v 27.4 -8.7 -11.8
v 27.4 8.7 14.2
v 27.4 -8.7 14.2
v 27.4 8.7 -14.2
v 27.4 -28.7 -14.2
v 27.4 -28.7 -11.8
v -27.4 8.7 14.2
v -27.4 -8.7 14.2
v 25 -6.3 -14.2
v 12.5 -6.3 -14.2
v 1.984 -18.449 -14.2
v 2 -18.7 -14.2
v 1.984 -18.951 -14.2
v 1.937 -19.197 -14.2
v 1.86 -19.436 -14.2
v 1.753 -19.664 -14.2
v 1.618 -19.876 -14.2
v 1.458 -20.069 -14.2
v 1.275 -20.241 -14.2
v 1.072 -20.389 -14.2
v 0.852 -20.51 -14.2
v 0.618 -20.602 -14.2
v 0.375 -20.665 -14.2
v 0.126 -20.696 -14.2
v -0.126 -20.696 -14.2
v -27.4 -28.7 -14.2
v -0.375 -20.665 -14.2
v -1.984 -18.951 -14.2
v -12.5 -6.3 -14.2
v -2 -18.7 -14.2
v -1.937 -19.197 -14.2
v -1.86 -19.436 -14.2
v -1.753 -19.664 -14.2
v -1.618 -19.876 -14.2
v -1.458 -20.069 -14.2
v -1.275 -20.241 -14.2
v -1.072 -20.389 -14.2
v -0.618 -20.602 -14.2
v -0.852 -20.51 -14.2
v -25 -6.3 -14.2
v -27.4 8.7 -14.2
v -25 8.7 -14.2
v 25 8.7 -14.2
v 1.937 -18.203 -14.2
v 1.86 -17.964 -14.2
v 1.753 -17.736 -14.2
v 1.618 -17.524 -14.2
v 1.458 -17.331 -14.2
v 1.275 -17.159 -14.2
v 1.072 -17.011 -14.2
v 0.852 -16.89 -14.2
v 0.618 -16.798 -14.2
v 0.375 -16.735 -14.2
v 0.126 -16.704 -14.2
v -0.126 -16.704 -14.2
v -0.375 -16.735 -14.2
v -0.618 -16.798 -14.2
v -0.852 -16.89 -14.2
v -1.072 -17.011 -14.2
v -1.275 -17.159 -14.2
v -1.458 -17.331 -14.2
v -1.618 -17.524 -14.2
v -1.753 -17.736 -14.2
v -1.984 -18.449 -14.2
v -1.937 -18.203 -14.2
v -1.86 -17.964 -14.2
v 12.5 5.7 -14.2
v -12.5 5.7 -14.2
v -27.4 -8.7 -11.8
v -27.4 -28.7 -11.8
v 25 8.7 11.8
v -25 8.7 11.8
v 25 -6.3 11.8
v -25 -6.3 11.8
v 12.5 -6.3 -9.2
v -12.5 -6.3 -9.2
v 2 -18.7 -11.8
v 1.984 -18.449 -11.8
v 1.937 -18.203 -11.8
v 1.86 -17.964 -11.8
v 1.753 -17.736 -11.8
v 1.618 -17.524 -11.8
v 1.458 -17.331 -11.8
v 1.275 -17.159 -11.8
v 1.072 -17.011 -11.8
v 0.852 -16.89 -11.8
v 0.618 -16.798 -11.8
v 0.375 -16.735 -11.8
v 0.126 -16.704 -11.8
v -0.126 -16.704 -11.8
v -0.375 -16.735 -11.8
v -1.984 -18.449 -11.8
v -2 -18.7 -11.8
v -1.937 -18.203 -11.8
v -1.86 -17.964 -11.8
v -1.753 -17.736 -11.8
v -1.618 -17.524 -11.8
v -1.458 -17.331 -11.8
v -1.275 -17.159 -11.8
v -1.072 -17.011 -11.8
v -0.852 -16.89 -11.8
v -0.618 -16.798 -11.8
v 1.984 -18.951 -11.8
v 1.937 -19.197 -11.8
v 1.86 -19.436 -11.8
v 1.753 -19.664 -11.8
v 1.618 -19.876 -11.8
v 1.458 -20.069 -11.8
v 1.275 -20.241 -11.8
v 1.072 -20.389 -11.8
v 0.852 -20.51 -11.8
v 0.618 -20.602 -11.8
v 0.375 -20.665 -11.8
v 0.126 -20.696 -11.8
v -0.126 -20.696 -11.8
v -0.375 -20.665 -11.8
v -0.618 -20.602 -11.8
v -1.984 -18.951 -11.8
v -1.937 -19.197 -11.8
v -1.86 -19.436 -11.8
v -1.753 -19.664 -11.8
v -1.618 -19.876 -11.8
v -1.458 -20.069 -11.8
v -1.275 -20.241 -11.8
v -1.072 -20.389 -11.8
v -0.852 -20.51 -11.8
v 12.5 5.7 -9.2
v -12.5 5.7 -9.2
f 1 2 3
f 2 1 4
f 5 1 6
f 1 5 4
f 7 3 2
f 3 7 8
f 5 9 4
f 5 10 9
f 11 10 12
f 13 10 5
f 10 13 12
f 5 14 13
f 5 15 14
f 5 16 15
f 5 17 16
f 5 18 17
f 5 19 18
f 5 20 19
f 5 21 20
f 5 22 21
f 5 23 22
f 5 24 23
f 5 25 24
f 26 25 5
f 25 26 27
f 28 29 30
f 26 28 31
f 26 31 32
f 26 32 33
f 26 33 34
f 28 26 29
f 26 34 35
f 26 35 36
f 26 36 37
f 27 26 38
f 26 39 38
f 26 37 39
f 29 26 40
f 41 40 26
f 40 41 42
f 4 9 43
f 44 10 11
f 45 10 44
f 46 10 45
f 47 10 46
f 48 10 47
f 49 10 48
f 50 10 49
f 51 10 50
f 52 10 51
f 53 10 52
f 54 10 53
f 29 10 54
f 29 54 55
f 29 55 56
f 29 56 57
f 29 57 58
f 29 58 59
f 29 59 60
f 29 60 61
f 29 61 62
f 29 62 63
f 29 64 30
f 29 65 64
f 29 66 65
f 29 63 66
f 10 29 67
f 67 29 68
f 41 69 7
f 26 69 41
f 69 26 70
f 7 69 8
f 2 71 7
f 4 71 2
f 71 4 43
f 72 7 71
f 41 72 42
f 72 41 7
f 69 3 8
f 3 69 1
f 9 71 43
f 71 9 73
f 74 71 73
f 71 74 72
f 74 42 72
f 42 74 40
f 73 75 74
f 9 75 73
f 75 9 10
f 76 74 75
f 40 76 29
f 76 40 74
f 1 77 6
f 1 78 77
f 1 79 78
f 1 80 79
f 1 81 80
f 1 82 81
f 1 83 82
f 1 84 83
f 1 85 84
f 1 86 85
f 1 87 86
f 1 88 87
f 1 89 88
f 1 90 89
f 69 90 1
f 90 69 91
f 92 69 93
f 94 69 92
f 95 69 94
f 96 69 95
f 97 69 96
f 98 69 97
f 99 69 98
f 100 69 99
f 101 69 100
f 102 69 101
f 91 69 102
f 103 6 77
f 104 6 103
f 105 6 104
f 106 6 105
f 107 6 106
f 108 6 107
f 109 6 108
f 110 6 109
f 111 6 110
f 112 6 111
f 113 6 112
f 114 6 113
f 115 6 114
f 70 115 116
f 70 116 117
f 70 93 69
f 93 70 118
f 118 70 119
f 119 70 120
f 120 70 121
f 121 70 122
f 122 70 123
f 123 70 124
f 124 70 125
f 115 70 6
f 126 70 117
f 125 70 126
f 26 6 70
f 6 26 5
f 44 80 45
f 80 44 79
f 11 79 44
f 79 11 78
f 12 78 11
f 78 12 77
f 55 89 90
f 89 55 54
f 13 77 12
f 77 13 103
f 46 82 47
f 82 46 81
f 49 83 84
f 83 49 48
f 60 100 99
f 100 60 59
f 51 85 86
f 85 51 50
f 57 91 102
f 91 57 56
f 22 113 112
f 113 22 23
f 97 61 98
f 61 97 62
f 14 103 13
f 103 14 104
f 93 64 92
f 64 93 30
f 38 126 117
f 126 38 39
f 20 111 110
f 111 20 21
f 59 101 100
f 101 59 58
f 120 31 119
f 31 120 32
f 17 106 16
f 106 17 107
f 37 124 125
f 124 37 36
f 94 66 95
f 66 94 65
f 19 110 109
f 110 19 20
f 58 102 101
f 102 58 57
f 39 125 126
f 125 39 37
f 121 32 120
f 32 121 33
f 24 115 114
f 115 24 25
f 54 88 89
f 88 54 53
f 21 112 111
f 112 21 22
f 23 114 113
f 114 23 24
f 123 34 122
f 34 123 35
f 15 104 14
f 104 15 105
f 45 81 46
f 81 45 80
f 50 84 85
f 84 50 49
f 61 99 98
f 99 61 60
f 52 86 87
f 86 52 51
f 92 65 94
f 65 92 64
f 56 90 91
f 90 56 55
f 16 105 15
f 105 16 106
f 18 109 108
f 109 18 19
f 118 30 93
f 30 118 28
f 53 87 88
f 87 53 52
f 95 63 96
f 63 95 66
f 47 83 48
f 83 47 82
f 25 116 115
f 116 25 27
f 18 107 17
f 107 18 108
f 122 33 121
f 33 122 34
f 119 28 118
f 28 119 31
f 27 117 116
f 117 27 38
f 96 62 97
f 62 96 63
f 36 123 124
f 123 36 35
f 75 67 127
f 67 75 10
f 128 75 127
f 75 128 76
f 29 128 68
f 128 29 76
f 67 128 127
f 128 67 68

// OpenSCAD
$strip_width=50;
$strip_height=26;
$frame_width=15;
$frame_thickness=2.4;

$holder_width=$strip_width+2*$frame_thickness;
$holder_length=20;
$holder_thickness=$frame_thickness;

$pin_width=25;
$pin_thickness=12;
$pin_heigth=5;


$screw_hole_diameter=4;
$fn=50;


difference(){
    cube([$strip_width+2*$frame_thickness,$frame_width+$frame_thickness,$strip_height+$frame_thickness], center=true);
    //strip cut
    translate([0,$frame_thickness/2,-$frame_thickness/2]) cube([$strip_width,$frame_width,$strip_height], center=true);
}
difference(){
    translate([0,-$holder_length/2-$frame_width/2-$frame_thickness/2,-$strip_height/2]) 
        cube([$holder_width,$holder_length,$holder_thickness], center=true);
    translate([0,-$holder_length/2-$frame_width/2-$frame_thickness/2,-$strip_height/2]) 
        cylinder(d=$screw_hole_diameter,h=2*$holder_thickness, center=true);
}

translate([0,$pin_thickness/2-$frame_width/2+$frame_thickness/2,$pin_heigth/2-$strip_height/2-$frame_thickness/2]) cube([$pin_width,$pin_thickness,$pin_heigth],center=true);
